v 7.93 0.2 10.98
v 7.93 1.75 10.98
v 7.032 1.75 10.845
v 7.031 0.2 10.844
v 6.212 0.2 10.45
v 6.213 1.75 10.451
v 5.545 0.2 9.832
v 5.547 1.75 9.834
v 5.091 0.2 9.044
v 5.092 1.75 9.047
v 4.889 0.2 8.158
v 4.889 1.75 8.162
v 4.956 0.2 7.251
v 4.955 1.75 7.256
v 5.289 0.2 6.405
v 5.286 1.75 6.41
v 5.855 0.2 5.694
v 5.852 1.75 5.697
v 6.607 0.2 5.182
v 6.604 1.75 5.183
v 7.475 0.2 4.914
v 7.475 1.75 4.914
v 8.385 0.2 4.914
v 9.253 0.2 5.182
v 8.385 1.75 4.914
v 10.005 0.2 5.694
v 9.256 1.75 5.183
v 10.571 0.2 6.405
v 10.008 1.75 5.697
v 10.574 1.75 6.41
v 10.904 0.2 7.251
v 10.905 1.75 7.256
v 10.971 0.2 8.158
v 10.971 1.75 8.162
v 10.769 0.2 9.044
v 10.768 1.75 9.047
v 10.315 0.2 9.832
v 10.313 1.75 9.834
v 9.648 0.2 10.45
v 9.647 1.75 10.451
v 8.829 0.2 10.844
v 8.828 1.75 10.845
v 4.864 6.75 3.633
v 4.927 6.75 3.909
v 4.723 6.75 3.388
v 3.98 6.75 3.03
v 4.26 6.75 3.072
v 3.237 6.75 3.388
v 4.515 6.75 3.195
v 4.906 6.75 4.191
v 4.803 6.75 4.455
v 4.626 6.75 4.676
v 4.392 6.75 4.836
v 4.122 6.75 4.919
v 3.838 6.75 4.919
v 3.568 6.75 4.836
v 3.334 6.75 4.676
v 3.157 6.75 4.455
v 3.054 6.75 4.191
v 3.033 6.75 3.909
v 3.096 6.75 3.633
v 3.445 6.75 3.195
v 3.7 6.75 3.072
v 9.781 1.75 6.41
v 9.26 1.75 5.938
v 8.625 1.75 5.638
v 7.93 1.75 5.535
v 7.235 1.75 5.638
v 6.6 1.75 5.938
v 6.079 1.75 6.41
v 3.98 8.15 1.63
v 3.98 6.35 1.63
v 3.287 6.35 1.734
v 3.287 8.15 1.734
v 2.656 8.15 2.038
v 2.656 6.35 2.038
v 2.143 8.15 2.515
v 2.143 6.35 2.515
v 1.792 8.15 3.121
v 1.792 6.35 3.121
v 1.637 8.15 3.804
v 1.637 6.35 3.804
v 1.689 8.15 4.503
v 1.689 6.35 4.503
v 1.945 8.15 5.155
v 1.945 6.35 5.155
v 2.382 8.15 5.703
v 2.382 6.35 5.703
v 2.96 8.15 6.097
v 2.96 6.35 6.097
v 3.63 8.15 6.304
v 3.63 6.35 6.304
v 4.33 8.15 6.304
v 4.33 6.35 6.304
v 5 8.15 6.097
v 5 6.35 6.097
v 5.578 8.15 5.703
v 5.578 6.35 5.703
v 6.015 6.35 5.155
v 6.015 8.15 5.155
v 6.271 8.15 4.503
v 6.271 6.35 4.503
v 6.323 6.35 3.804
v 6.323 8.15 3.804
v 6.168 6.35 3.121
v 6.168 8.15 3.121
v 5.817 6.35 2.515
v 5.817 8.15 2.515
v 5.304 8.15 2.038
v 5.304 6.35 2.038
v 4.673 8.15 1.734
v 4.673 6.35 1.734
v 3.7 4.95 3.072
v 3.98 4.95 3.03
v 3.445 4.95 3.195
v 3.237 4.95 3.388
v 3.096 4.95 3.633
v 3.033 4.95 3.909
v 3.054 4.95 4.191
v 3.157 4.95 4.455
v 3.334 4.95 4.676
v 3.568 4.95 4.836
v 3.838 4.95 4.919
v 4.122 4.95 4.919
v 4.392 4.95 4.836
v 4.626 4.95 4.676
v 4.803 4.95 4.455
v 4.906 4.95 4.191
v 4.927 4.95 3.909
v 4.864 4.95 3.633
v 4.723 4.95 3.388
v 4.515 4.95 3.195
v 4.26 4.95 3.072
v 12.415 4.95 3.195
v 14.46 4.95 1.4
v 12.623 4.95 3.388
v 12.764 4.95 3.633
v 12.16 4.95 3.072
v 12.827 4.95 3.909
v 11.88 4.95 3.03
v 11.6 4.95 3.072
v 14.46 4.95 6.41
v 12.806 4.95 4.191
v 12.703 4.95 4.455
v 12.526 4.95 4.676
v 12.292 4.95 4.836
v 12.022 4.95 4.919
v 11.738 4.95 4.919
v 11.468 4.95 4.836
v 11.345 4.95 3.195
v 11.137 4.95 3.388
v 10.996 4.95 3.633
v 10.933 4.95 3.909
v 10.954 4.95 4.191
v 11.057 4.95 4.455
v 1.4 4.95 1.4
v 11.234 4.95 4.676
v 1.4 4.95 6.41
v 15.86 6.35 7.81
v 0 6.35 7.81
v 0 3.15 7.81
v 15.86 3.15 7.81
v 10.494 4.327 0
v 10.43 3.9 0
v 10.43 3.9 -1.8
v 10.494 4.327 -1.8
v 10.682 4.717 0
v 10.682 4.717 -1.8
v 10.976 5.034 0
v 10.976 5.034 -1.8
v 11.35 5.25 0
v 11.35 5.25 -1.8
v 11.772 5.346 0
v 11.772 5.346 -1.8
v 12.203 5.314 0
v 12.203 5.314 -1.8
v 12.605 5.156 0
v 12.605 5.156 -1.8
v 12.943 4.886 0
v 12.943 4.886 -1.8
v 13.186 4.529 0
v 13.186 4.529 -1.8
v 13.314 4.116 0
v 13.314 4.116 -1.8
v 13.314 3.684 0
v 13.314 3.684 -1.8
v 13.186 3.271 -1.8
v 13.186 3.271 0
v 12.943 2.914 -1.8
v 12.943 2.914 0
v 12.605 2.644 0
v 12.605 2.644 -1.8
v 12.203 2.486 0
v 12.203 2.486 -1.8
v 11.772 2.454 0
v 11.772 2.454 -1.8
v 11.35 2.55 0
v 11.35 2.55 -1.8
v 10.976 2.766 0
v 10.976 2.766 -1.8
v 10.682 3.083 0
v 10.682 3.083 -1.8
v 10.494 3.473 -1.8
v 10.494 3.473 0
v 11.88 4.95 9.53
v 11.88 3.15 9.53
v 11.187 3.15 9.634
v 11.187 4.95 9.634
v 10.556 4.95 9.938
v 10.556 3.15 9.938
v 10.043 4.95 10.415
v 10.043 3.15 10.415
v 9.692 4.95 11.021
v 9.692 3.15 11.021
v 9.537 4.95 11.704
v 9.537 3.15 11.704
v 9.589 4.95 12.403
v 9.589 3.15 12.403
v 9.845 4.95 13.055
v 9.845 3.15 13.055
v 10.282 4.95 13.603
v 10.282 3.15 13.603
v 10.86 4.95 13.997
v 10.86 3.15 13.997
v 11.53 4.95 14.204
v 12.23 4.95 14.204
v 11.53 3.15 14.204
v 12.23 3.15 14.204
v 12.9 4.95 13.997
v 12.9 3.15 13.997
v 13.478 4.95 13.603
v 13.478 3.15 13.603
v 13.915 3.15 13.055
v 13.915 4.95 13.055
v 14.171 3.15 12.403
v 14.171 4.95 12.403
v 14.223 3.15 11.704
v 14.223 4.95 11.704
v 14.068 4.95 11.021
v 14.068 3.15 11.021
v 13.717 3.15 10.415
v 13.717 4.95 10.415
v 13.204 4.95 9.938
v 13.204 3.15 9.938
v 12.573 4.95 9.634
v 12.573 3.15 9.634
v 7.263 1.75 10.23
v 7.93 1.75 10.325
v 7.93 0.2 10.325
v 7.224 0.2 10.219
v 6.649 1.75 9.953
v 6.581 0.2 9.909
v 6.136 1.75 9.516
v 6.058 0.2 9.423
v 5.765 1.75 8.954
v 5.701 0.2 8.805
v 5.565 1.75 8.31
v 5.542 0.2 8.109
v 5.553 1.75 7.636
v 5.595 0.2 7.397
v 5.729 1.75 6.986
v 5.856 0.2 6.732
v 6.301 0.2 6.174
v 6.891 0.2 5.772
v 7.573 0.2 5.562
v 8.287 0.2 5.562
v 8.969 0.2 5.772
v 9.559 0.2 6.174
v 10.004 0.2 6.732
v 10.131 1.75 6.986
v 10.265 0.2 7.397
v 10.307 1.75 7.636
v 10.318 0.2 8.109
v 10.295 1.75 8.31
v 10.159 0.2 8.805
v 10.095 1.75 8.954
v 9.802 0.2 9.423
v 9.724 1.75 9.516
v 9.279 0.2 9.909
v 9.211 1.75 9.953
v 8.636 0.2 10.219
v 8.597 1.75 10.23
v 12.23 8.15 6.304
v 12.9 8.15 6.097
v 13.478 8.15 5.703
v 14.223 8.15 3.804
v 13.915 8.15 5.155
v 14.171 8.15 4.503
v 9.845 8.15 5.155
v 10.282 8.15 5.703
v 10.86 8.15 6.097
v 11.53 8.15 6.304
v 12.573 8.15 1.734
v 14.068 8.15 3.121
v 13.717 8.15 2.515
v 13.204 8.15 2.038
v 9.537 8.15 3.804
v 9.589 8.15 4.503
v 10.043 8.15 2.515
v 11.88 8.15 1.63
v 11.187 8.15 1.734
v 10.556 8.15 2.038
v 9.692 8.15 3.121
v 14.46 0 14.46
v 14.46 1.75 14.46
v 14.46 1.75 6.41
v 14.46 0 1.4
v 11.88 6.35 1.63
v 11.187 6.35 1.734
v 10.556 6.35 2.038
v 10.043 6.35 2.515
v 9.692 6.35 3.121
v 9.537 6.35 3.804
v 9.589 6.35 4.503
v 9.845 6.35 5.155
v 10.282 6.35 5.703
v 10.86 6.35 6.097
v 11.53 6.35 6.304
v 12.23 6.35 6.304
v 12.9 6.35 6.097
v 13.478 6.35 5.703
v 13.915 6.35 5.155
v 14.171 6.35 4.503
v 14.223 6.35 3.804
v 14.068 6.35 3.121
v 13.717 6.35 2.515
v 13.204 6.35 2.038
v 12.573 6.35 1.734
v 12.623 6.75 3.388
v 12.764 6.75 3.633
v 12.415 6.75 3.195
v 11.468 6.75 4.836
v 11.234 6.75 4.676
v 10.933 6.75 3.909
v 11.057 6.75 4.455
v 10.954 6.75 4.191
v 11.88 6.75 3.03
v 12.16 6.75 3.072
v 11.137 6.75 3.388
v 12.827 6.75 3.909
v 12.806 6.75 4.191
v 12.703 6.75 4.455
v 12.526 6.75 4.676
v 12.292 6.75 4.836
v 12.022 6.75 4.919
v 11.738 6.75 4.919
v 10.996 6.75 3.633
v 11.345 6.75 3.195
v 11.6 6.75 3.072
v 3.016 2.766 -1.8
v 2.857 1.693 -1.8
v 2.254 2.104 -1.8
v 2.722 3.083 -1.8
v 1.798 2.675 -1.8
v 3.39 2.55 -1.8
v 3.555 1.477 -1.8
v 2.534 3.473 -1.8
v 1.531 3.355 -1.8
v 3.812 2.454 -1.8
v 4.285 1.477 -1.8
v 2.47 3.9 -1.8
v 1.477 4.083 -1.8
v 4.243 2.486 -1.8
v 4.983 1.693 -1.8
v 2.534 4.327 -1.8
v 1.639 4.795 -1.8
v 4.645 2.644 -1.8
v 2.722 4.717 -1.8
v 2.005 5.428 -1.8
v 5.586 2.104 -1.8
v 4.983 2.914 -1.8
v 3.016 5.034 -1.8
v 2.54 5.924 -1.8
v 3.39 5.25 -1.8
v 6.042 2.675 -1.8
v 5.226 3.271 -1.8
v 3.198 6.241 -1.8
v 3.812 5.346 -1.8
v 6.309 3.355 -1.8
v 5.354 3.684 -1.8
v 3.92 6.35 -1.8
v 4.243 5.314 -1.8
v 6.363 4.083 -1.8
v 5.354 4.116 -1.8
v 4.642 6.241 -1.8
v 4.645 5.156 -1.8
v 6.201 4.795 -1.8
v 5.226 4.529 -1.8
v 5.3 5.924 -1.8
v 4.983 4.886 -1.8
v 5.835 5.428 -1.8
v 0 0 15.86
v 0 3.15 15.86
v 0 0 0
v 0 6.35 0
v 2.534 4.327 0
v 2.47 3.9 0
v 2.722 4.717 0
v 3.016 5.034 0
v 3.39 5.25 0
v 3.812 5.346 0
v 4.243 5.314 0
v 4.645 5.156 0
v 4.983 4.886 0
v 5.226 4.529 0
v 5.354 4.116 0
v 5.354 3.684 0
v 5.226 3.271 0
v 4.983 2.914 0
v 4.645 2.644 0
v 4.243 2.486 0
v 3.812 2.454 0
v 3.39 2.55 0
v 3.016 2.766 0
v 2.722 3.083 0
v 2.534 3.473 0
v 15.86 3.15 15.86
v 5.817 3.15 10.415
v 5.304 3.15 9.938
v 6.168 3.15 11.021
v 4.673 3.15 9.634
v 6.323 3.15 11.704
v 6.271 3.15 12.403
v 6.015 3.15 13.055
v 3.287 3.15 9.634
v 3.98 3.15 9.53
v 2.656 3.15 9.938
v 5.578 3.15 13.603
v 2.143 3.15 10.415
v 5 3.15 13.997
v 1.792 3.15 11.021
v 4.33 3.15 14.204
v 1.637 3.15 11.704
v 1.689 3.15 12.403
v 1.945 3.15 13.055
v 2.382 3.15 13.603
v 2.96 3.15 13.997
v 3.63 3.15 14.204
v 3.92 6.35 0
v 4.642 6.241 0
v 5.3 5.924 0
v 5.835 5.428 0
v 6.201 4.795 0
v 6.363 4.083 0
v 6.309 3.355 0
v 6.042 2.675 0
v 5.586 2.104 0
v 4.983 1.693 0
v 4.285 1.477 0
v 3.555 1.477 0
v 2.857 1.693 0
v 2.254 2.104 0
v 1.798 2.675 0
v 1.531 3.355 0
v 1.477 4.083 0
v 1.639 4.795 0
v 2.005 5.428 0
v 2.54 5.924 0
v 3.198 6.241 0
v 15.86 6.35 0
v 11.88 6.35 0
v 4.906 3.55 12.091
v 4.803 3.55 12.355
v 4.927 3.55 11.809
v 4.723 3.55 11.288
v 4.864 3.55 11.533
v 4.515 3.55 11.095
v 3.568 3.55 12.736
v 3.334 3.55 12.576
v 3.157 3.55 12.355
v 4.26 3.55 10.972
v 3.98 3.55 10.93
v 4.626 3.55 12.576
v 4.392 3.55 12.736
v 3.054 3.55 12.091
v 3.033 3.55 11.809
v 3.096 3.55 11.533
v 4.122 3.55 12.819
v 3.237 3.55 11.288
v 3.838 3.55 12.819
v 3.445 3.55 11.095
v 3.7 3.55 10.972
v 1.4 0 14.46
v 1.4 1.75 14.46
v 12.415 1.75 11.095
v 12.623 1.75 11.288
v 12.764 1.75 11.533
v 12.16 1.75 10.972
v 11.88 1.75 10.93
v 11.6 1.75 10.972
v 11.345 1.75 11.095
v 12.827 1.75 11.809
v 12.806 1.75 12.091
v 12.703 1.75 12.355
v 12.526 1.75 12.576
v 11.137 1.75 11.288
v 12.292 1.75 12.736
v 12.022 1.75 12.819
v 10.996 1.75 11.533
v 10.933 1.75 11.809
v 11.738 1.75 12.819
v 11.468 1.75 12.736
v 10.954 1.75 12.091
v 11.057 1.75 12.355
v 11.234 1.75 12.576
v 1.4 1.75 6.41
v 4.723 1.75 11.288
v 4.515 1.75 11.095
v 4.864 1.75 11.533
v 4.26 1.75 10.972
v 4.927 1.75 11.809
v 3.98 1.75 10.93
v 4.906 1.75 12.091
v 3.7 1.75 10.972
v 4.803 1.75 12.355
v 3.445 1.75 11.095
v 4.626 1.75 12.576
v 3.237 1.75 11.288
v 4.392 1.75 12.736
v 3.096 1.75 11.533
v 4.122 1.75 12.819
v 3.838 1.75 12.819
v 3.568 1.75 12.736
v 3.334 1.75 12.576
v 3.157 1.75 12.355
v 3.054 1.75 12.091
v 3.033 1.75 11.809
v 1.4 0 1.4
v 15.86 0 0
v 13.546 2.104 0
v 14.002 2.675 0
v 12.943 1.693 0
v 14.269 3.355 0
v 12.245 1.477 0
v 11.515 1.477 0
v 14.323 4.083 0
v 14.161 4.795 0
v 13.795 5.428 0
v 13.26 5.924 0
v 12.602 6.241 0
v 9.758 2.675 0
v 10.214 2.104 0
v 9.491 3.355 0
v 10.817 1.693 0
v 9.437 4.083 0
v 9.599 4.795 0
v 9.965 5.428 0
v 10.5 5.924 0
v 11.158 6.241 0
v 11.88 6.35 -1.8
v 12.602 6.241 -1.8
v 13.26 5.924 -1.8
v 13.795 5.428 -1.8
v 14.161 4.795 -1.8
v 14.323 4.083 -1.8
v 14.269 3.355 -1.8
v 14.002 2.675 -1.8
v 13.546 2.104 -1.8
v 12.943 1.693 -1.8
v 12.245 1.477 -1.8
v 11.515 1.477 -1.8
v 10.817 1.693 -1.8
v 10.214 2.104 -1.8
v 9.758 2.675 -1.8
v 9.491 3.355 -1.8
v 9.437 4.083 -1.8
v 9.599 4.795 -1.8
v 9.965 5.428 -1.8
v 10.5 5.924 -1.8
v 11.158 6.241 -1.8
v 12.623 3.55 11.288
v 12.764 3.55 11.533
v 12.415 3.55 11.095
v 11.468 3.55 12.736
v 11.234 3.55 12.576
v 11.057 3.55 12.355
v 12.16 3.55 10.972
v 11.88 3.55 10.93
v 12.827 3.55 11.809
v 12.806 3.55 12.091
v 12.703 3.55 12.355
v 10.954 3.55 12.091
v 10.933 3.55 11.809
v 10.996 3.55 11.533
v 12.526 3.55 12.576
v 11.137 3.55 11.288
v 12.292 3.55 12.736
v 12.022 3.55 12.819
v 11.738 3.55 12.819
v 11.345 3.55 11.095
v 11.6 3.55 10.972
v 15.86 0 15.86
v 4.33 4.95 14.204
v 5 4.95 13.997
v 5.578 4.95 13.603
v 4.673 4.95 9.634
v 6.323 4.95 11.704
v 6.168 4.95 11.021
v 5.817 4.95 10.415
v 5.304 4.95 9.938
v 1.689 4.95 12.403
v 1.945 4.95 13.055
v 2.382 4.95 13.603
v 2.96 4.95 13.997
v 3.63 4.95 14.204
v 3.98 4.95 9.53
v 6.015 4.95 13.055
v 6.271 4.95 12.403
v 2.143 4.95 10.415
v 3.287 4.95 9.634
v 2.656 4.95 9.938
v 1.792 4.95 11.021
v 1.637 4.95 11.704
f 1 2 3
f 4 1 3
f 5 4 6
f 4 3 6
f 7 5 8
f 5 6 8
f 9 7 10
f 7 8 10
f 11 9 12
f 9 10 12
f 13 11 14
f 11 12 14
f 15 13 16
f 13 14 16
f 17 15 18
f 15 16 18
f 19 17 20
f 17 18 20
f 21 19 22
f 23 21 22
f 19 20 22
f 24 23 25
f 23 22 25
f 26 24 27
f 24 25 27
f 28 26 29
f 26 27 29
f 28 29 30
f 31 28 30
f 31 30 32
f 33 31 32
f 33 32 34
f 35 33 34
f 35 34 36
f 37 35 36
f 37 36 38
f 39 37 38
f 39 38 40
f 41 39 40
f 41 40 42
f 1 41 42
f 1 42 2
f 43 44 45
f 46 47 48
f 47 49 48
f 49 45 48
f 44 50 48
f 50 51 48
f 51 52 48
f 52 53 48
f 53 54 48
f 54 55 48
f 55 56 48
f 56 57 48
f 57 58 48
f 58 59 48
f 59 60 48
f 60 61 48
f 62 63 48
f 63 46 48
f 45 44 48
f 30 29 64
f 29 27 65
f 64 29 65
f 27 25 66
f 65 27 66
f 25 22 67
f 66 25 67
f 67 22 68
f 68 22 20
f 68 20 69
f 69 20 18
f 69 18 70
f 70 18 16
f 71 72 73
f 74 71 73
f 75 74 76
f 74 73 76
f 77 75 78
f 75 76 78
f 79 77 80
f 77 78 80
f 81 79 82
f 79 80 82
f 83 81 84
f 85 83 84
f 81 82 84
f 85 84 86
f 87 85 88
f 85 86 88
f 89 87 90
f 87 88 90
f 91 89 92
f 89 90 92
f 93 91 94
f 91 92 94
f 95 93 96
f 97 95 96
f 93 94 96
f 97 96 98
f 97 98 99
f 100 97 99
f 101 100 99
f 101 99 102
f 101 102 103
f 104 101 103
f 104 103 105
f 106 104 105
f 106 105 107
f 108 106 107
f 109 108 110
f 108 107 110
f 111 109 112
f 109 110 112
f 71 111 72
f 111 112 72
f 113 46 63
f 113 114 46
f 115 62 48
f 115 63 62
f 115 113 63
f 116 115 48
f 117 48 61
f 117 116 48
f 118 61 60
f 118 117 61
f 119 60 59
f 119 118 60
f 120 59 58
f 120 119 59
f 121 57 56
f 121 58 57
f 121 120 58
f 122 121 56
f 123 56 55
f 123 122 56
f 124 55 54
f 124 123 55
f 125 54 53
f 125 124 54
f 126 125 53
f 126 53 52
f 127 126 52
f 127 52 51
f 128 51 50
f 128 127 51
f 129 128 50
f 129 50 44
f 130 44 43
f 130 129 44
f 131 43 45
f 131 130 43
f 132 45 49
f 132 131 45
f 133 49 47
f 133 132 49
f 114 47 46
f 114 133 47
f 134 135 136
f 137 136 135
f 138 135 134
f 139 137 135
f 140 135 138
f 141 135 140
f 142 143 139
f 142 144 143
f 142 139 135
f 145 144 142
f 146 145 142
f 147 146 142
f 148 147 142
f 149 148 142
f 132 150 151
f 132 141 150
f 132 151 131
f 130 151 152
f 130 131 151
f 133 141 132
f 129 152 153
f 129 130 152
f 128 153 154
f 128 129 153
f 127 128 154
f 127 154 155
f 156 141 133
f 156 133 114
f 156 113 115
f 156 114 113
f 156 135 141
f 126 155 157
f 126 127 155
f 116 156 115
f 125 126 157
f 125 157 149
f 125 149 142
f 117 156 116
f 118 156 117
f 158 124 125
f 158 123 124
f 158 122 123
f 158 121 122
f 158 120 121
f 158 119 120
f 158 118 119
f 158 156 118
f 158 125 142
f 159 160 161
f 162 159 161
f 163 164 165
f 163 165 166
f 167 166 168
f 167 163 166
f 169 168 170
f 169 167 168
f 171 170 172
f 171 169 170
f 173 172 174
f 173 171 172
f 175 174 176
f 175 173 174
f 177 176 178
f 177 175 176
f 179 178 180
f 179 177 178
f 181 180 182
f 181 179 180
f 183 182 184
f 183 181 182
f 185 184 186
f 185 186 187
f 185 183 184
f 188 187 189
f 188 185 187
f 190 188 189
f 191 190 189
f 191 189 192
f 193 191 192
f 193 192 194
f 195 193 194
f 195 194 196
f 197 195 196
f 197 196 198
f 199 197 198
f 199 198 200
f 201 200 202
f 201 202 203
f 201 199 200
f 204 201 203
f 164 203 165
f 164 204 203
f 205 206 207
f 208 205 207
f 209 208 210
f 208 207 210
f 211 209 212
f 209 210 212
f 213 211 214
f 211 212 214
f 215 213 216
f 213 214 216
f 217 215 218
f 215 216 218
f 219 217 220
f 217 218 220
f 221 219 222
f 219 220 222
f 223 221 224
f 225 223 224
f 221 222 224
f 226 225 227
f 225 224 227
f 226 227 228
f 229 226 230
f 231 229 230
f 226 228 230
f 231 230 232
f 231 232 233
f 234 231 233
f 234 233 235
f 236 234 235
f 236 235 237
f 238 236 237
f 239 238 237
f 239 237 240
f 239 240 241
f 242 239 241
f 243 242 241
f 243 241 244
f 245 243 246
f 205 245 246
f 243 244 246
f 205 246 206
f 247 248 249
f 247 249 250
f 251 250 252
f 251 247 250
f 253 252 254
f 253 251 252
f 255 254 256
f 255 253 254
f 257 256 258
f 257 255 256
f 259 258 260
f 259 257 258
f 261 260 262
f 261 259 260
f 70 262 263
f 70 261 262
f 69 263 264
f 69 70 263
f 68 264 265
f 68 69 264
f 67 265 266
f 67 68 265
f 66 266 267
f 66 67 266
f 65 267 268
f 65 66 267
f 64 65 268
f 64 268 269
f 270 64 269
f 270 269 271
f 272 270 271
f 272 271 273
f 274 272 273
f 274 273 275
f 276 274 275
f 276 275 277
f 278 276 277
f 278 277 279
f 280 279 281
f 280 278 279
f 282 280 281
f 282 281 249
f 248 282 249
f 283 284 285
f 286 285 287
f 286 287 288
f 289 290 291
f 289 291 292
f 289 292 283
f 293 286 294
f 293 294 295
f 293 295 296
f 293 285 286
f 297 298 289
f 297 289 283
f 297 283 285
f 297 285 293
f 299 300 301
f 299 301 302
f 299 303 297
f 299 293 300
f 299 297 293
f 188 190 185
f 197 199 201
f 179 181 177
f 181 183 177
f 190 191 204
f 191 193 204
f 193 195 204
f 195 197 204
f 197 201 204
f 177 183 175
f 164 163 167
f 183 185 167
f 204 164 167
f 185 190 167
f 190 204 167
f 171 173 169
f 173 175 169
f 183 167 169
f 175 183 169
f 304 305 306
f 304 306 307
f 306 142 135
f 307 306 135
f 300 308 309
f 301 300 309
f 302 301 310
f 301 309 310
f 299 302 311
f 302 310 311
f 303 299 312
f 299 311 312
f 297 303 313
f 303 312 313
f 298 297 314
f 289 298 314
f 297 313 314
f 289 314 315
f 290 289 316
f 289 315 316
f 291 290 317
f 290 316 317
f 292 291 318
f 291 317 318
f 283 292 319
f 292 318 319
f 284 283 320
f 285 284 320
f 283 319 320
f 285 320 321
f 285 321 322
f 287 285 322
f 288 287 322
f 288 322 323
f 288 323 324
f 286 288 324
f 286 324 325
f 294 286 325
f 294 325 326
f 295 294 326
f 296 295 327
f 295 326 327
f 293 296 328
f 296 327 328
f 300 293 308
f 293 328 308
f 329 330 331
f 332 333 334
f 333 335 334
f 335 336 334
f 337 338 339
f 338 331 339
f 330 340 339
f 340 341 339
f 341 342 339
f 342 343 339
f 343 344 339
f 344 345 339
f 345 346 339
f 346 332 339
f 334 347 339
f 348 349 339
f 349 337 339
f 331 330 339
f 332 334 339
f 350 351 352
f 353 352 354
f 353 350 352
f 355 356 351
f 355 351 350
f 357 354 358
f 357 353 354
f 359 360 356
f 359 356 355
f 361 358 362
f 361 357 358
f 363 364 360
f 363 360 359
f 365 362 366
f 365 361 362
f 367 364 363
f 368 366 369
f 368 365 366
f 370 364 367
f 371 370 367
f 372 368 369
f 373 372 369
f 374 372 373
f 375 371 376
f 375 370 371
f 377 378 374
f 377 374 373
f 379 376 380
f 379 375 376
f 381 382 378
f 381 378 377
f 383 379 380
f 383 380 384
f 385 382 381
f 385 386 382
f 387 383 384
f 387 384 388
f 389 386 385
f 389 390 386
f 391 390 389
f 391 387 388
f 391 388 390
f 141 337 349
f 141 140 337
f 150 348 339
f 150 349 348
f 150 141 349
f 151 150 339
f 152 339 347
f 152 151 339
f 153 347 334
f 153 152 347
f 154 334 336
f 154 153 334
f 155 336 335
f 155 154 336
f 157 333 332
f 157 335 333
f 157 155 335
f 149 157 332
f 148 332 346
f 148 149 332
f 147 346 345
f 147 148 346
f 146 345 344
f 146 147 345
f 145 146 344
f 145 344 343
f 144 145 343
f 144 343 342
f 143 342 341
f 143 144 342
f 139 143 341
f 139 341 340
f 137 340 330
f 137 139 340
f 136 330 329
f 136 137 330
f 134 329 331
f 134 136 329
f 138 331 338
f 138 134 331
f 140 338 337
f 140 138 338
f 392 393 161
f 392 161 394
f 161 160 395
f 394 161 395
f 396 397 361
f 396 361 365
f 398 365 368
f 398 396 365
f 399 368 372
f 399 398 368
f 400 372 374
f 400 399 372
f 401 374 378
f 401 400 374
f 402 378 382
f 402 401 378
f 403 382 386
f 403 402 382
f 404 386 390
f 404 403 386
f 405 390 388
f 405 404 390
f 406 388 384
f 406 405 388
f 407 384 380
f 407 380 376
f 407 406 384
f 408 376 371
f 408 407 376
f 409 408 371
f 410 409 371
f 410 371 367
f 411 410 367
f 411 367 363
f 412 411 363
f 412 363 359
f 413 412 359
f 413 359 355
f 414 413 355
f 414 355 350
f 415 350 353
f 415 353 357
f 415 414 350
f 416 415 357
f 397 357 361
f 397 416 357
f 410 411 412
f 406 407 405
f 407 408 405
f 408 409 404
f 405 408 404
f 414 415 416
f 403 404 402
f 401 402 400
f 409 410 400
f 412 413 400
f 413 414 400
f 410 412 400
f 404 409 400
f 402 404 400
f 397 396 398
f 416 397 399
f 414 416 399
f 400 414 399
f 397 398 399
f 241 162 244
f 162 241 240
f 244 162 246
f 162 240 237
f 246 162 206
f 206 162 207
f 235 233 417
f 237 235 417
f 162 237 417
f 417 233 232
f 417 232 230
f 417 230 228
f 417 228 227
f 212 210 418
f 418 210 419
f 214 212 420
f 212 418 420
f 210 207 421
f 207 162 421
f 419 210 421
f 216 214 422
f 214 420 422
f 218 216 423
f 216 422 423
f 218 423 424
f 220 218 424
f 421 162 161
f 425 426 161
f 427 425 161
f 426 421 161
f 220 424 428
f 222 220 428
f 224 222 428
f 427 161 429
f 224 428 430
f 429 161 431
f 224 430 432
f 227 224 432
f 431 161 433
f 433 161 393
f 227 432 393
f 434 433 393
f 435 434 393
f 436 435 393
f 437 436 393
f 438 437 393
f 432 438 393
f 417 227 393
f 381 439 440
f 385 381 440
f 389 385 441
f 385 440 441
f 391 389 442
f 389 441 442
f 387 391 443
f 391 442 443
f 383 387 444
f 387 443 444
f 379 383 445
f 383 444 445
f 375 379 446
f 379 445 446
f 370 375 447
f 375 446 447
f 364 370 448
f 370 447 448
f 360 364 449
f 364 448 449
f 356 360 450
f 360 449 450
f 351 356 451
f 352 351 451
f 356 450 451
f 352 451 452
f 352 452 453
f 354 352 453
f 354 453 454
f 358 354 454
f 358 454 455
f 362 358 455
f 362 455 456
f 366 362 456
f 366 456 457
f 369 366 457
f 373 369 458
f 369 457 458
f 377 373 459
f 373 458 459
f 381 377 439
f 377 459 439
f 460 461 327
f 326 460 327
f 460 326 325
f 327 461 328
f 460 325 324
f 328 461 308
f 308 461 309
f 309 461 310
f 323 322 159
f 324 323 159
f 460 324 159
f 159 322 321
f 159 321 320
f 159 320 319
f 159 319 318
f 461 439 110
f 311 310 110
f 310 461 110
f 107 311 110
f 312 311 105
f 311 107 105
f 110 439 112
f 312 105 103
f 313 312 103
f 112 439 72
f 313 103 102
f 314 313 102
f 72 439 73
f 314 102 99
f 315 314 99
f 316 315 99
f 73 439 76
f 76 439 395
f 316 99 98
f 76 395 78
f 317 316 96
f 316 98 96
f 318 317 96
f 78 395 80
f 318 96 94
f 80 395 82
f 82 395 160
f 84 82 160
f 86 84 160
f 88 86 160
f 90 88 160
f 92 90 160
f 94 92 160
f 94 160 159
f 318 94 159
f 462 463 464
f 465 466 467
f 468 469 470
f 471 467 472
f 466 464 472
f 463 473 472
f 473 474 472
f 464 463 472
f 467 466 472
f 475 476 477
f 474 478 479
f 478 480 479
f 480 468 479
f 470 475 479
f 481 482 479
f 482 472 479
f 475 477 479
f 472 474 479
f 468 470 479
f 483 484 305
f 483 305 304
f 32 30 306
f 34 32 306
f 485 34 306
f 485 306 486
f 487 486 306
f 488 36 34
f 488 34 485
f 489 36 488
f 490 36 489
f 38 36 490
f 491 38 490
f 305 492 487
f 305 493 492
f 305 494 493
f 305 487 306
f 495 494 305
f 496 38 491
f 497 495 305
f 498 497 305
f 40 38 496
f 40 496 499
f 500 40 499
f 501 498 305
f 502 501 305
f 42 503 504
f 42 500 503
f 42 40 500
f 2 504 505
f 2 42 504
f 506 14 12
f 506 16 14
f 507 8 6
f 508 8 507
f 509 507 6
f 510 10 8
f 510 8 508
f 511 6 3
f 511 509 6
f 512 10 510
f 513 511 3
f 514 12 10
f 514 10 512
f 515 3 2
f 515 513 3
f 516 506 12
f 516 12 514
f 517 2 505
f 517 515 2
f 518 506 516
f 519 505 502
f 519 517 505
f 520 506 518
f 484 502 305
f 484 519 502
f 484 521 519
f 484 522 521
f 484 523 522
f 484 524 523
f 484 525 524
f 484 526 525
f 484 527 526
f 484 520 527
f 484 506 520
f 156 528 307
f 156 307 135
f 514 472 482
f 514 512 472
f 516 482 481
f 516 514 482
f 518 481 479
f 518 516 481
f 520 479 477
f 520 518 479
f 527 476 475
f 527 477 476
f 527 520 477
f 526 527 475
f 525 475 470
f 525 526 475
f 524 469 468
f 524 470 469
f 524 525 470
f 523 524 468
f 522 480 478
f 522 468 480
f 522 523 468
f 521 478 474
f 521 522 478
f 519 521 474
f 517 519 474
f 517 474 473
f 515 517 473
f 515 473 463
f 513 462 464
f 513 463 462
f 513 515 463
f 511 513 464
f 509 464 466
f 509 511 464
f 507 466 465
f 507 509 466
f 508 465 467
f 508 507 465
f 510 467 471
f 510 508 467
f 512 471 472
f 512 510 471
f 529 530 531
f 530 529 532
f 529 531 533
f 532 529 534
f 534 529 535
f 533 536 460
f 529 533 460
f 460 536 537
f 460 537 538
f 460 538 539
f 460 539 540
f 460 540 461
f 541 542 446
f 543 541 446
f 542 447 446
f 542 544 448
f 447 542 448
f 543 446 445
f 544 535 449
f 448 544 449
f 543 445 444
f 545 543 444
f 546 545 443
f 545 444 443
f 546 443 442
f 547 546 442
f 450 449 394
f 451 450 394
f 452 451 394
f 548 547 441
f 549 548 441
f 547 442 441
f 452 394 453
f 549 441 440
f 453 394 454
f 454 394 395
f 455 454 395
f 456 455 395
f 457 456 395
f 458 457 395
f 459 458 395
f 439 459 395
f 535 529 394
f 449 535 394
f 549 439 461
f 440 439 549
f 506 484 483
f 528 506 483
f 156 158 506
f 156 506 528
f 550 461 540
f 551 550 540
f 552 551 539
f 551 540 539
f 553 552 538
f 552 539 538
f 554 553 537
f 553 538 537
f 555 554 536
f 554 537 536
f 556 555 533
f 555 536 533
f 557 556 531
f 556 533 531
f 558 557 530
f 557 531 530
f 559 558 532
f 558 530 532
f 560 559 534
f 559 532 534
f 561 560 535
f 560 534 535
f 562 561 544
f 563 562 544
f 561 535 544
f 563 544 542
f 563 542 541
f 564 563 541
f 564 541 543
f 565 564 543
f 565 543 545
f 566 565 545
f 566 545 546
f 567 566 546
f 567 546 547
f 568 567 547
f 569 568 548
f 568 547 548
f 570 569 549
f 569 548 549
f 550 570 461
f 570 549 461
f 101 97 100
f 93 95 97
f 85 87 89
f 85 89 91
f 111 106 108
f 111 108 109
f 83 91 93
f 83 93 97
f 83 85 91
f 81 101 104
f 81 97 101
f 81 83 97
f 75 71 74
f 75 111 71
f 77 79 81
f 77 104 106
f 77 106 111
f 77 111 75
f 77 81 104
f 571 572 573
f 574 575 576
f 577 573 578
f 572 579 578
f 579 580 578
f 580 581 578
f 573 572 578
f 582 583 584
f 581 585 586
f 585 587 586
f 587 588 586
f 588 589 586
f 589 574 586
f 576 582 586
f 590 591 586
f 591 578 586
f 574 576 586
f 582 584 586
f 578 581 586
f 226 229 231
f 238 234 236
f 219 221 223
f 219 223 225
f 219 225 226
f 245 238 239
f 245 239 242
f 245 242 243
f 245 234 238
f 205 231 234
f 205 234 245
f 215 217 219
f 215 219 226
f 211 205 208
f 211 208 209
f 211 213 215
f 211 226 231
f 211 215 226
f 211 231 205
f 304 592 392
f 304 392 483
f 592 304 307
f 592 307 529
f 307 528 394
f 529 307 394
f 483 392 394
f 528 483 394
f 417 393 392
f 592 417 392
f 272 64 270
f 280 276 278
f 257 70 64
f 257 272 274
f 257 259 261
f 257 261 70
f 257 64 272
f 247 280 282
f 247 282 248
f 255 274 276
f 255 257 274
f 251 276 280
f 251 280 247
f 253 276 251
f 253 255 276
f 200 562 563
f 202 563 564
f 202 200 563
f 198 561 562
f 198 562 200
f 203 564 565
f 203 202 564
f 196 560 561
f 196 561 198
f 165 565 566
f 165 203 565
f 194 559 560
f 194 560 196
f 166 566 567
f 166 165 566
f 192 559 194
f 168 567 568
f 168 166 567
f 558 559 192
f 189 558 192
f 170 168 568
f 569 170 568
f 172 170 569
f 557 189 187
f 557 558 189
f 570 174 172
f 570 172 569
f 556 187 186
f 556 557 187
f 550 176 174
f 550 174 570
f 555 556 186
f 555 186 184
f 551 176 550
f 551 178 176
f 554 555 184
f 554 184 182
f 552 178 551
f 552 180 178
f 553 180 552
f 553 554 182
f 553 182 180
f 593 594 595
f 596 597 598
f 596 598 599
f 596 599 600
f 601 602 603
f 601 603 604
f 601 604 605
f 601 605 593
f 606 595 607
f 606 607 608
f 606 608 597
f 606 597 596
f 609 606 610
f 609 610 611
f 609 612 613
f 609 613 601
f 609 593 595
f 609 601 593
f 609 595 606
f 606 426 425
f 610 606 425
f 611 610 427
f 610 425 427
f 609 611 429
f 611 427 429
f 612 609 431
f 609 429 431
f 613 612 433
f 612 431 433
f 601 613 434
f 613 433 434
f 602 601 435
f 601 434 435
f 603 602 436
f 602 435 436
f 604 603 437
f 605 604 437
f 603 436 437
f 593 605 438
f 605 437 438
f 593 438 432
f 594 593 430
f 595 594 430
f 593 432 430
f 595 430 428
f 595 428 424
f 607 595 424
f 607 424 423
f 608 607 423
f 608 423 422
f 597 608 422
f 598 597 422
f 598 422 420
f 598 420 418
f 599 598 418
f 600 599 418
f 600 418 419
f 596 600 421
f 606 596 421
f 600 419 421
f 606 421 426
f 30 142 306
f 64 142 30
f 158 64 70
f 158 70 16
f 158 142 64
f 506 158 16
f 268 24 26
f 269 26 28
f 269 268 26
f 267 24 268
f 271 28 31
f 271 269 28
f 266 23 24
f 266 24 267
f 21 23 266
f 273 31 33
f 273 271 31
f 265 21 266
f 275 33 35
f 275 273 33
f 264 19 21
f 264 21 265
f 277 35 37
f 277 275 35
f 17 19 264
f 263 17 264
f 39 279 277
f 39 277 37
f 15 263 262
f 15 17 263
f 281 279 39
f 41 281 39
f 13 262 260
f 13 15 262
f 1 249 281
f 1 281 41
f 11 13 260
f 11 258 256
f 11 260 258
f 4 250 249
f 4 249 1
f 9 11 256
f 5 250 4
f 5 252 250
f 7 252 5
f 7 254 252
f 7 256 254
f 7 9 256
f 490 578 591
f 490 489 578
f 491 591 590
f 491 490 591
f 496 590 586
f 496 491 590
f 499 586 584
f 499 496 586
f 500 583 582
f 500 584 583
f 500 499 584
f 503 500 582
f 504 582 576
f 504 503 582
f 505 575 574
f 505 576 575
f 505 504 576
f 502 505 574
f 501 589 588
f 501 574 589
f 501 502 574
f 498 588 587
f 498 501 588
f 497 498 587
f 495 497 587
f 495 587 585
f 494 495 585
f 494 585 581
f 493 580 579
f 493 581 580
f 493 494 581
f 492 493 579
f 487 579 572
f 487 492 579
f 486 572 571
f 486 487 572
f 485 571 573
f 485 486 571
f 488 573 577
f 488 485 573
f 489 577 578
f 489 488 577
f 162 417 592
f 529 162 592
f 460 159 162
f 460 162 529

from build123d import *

# Parameters (mm, degrees)
BOSS_EXTRUDE1_DEPTH = 15.86
SKETCH3_R           = 2.35
BOSS_EXTRUDE2_DEPTH = 1.8
SKETCH4_R           = 2.35
BOSS_EXTRUDE3_DEPTH = 1.8
SHELL1_T            = -1.4
SKETCH5_R           = 2.45
SKETCH5_R_2         = 1.45
BOSS_EXTRUDE4_DEPTH = 1.8
SKETCH6_R           = 3.05
SKETCH6_R_2         = 2.395
BOSS_EXTRUDE5_DEPTH = 1.55


with BuildPart() as part:
    # Sketch2 → Boss-Extrude1 (new body)
    with BuildSketch(Plane(origin=(0, 0, 0), x_dir=(0, 0, -1), z_dir=(1, 0, 0))):
        Polygon((0, 0), (0, 6.35), (-7.81, 6.35), (-7.81, 3.15), (-15.86, 3.15), (-15.86, 0), align=None)
    extrude(amount=BOSS_EXTRUDE1_DEPTH)

    # Sketch3 → Boss-Extrude2 (add)
    with BuildSketch(Plane(origin=(0, 6.35, 0), x_dir=(1, 0, 0), z_dir=(0, 1, 0))):
        with Locations(Location((3.98, -3.98, 0), (0, 0, 90))):
            Circle(SKETCH3_R)
        with Locations(Location((11.88, -3.98, 0), (0, 0, 90))):
            Circle(SKETCH3_R)
    extrude(amount=BOSS_EXTRUDE2_DEPTH)

    # Sketch4 → Boss-Extrude3 (add)
    with BuildSketch(Plane(origin=(0, 3.15, 0), x_dir=(1, 0, 0), z_dir=(0, 1, 0))):
        with Locations(Location((3.98, -11.88, 0), (0, 0, 90))):
            Circle(SKETCH4_R)
        with Locations(Location((11.88, -11.88, 0), (0, 0, 90))):
            Circle(SKETCH4_R)
    extrude(amount=BOSS_EXTRUDE3_DEPTH)

    # Shell1
    shell1_openings = [part.faces().sort_by_distance(p)[0] for p in [
        (7.93, 0, 7.93),
    ]]
    offset(amount=SHELL1_T, openings=shell1_openings, kind=Kind.INTERSECTION)

    # Sketch5 → Boss-Extrude4 (add)
    # profile 1 of 2: a face of its own
    with BuildSketch(Plane(origin=(0, 0, 0), x_dir=(-1, 0, 0), z_dir=(0, 0, -1))):
        with Locations(Location((-11.88, 3.9, 0), (0, 0, 90))):
            Circle(SKETCH5_R)
        with Locations((-11.88, 3.9)):
            Circle(SKETCH5_R_2, mode=Mode.SUBTRACT)
    # profile 2 of 2: a face of its own
    with BuildSketch(Plane(origin=(0, 0, 0), x_dir=(-1, 0, 0), z_dir=(0, 0, -1))):
        with Locations(Location((-3.92, 3.9, 0), (0, 0, 90))):
            Circle(SKETCH5_R)
        with Locations((-3.92, 3.9)):
            Circle(SKETCH5_R_2, mode=Mode.SUBTRACT)
    extrude(amount=BOSS_EXTRUDE4_DEPTH)

    # Sketch6 → Boss-Extrude5 (add)
    with BuildSketch(Plane.XZ.offset(-1.75)):
        with Locations(Location((7.93, 7.93, 0), (0, 0, 90))):
            Circle(SKETCH6_R)
        with Locations(Location((7.93, 7.93, 0), (0, 0, 90))):
            Circle(SKETCH6_R_2, mode=Mode.SUBTRACT)
    extrude(amount=BOSS_EXTRUDE5_DEPTH)


solid = part.part
